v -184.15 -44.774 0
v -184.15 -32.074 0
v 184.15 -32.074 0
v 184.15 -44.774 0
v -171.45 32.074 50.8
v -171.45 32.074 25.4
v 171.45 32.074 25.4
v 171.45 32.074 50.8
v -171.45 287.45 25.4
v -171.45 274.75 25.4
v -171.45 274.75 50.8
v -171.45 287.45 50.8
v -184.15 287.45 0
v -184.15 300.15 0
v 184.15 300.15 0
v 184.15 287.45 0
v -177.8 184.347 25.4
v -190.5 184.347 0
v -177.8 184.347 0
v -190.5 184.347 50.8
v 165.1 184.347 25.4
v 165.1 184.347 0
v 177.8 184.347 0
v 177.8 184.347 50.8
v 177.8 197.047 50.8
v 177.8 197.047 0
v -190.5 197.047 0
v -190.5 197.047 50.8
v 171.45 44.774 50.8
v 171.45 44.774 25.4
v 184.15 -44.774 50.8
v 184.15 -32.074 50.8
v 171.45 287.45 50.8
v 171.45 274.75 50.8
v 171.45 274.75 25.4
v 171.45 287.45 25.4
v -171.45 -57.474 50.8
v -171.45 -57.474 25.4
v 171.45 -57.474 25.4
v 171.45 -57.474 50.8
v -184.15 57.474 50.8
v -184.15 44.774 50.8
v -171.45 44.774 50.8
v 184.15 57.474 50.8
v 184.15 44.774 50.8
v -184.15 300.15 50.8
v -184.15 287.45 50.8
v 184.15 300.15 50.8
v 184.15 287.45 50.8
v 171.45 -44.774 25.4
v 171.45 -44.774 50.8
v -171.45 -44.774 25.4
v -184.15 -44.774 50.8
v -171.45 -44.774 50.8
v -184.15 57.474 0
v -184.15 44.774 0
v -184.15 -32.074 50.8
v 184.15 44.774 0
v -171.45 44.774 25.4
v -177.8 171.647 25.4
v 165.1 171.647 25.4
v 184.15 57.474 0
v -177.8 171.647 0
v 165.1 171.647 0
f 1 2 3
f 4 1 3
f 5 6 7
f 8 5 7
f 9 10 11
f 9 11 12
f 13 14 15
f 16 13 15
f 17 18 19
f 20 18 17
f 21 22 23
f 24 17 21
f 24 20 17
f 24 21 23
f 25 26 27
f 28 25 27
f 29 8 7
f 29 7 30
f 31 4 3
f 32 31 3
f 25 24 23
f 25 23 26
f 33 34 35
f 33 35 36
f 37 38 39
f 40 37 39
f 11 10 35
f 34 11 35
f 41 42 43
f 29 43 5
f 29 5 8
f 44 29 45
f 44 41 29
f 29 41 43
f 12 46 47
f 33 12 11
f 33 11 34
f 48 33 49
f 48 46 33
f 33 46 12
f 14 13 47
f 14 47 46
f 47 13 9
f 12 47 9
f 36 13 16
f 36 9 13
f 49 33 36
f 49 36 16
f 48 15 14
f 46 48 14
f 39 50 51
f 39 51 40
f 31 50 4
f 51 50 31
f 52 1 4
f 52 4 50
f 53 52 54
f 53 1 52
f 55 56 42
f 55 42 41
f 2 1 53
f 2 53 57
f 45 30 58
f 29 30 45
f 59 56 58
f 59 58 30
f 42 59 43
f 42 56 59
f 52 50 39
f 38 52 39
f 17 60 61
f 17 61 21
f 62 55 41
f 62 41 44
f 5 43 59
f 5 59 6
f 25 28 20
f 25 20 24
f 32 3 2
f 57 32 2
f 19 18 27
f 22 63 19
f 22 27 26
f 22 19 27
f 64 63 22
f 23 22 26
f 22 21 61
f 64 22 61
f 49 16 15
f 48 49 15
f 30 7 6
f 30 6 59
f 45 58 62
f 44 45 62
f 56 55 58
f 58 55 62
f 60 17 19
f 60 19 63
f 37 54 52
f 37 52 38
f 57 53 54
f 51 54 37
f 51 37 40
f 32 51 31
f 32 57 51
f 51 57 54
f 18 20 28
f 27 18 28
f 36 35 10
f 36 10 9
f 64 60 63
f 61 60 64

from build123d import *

# Parameters (mm, degrees)
F0_W       = 368.3
F0_H       = 25.4
F0_W_2     = 184.15
F1_DEPTH   = 50.8
F2_W       = 12.7
F2_H       = 12.7
F3_DEPTH   = 61.214
F4_W       = 12.7
F4_H       = 12.7
F5_DEPTH   = 76.2
F6_W       = 12.7
F6_H       = 50.8
F7_DEPTH   = 12.7
F8_W       = 12.7
F8_H       = 50.8
F9_DEPTH   = 12.7
F10_DEPTH  = 50.8
F11_W      = 12.7
F11_H      = 50.8
F12_DEPTH  = 12.7
F13_W      = 12.7
F13_H      = 50.8
F14_DEPTH  = 12.7
F15_W      = 12.7
F15_H      = 12.7
F16_DEPTH  = 90.678
F17_W      = 12.7
F17_H      = 25.4
F18_DEPTH  = 431.8
F19_W      = 12.7
F19_H      = 25.4
F20_DEPTH  = 457.2
F21_W      = 12.7
F21_H      = 25.4
F22_DEPTH  = 457.2
F23_W      = 12.7
F23_H      = 25.4
F24_DEPTH  = 431.8
F22_FACE_W = 342.9
F22_FACE_H = 12.7
F26_DEPTH  = 25.4
F25_W      = 12.7
F25_H      = 25.4
F27_DEPTH  = 685.8


with BuildPart() as f1:
    # F0 (on Top) → F1 (new body)
    with BuildSketch(Plane.XY):
        with Locations((0, 44.773751)):
            Rectangle(F0_W, F0_H)
        with Locations((-92.075, -44.773751)):
            Rectangle(F0_W_2, F0_H)
        with Locations((92.075, -44.773751)):
            Rectangle(F0_W_2, F0_H)
        with Locations((-92.075, 287.450363)):
            Rectangle(F0_W_2, F0_H)
        with Locations((92.075, 287.450363)):
            Rectangle(F0_W_2, F0_H)
        with Locations((-98.425, 184.347487)):
            Rectangle(F0_W_2, F0_H)
        with Locations((85.725, 184.347487)):
            Rectangle(F0_W_2, F0_H)
    extrude(amount=F1_DEPTH)

    # F2 (on face) → F3 (cut)
    with BuildSketch(Plane.XY.offset(50.8)):
        with Locations((-177.8, 281.100363)):
            Rectangle(F2_W, F2_H)
    extrude(amount=-F3_DEPTH, mode=Mode.SUBTRACT)

    # F4 (on face) → F5 (cut)
    with BuildSketch(Plane.XY.offset(50.8)):
        with Locations((-184.15, 177.997487)):
            Rectangle(F4_W, F4_H)
    extrude(amount=-F5_DEPTH, mode=Mode.SUBTRACT)

    # F6 (on face) → F7 (cut)
    with BuildSketch(Plane(origin=(-184.15, 0, 0), x_dir=(0, -1, 0), z_dir=(-1, 0, 0))):
        with Locations((-38.423751, 25.4)):
            Rectangle(F6_W, F6_H)
    extrude(amount=-F7_DEPTH, mode=Mode.SUBTRACT)

    # F8 (on face) → F9 (cut)
    with BuildSketch(Plane(origin=(-184.15, 0, 0), x_dir=(0, -1, 0), z_dir=(-1, 0, 0))):
        with Locations((51.123751, 25.4)):
            Rectangle(F8_W, F8_H)
    extrude(amount=-F9_DEPTH, mode=Mode.SUBTRACT)

    # F2 (on face) → F10 (cut)
    with BuildSketch(Plane.XY.offset(50.8)):
        with Locations((-177.8, 281.100363)):
            Rectangle(F2_W, F2_H)
        with Locations((177.8, 281.100363)):
            Rectangle(F2_W, F2_H)
    extrude(amount=-F10_DEPTH, mode=Mode.SUBTRACT)

    # F11 (on face) → F12 (cut)
    with BuildSketch(Plane.YZ.offset(177.8)):
        with Locations((177.997487, 25.4)):
            Rectangle(F11_W, F11_H)
    extrude(amount=-F12_DEPTH, mode=Mode.SUBTRACT)

    # F13 (on face) → F14 (cut)
    with BuildSketch(Plane.YZ.offset(184.15)):
        with Locations((38.423751, 25.4)):
            Rectangle(F13_W, F13_H)
    extrude(amount=-F14_DEPTH, mode=Mode.SUBTRACT)

    # F15 (on face) → F16 (cut)
    with BuildSketch(Plane(origin=(0, 0, 0), x_dir=(1, 0, 0), z_dir=(0, 0, -1))):
        with Locations((177.8, 51.123751)):
            Rectangle(F15_W, F15_H)
    extrude(amount=-F16_DEPTH, mode=Mode.SUBTRACT)

    # F17 (on face) → F18 (cut)
    with BuildSketch(Plane(origin=(-171.45, 0, 0), x_dir=(0, -1, 0), z_dir=(-1, 0, 0))):
        with Locations((51.123751, 12.7)):
            Rectangle(F17_W, F17_H)
    extrude(amount=-F18_DEPTH, mode=Mode.SUBTRACT)

    # F19 (on face) → F20 (cut)
    with BuildSketch(Plane.YZ.offset(171.45)):
        with Locations((38.423751, 12.7)):
            Rectangle(F19_W, F19_H)
    extrude(amount=-F20_DEPTH, mode=Mode.SUBTRACT)

    # F21 (on face) → F22 (cut)
    with BuildSketch(Plane.YZ.offset(165.1)):
        with Locations((177.997487, 12.7)):
            Rectangle(F21_W, F21_H)
    extrude(amount=-F22_DEPTH, mode=Mode.SUBTRACT)

    # F23 (on face) → F24 (cut)
    with BuildSketch(Plane.YZ.offset(171.45)):
        with Locations((281.100363, 12.7)):
            Rectangle(F23_W, F23_H)
    extrude(amount=-F24_DEPTH, mode=Mode.SUBTRACT)

    # F22_face (on face) → F26 (join)
    with BuildSketch(Plane(origin=(-6.35, 177.997487, 25.4), x_dir=(1, 0, 0), z_dir=(0, 0, -1))):
        Rectangle(F22_FACE_W, F22_FACE_H)
    extrude(amount=F26_DEPTH)

    # F25 (on face) → F27 (cut)
    with BuildSketch(Plane.YZ.offset(165.1)):
        with Locations((177.997487, 38.1)):
            Rectangle(F25_W, F25_H)
    extrude(amount=-F27_DEPTH, mode=Mode.SUBTRACT)


solid = f1.part
